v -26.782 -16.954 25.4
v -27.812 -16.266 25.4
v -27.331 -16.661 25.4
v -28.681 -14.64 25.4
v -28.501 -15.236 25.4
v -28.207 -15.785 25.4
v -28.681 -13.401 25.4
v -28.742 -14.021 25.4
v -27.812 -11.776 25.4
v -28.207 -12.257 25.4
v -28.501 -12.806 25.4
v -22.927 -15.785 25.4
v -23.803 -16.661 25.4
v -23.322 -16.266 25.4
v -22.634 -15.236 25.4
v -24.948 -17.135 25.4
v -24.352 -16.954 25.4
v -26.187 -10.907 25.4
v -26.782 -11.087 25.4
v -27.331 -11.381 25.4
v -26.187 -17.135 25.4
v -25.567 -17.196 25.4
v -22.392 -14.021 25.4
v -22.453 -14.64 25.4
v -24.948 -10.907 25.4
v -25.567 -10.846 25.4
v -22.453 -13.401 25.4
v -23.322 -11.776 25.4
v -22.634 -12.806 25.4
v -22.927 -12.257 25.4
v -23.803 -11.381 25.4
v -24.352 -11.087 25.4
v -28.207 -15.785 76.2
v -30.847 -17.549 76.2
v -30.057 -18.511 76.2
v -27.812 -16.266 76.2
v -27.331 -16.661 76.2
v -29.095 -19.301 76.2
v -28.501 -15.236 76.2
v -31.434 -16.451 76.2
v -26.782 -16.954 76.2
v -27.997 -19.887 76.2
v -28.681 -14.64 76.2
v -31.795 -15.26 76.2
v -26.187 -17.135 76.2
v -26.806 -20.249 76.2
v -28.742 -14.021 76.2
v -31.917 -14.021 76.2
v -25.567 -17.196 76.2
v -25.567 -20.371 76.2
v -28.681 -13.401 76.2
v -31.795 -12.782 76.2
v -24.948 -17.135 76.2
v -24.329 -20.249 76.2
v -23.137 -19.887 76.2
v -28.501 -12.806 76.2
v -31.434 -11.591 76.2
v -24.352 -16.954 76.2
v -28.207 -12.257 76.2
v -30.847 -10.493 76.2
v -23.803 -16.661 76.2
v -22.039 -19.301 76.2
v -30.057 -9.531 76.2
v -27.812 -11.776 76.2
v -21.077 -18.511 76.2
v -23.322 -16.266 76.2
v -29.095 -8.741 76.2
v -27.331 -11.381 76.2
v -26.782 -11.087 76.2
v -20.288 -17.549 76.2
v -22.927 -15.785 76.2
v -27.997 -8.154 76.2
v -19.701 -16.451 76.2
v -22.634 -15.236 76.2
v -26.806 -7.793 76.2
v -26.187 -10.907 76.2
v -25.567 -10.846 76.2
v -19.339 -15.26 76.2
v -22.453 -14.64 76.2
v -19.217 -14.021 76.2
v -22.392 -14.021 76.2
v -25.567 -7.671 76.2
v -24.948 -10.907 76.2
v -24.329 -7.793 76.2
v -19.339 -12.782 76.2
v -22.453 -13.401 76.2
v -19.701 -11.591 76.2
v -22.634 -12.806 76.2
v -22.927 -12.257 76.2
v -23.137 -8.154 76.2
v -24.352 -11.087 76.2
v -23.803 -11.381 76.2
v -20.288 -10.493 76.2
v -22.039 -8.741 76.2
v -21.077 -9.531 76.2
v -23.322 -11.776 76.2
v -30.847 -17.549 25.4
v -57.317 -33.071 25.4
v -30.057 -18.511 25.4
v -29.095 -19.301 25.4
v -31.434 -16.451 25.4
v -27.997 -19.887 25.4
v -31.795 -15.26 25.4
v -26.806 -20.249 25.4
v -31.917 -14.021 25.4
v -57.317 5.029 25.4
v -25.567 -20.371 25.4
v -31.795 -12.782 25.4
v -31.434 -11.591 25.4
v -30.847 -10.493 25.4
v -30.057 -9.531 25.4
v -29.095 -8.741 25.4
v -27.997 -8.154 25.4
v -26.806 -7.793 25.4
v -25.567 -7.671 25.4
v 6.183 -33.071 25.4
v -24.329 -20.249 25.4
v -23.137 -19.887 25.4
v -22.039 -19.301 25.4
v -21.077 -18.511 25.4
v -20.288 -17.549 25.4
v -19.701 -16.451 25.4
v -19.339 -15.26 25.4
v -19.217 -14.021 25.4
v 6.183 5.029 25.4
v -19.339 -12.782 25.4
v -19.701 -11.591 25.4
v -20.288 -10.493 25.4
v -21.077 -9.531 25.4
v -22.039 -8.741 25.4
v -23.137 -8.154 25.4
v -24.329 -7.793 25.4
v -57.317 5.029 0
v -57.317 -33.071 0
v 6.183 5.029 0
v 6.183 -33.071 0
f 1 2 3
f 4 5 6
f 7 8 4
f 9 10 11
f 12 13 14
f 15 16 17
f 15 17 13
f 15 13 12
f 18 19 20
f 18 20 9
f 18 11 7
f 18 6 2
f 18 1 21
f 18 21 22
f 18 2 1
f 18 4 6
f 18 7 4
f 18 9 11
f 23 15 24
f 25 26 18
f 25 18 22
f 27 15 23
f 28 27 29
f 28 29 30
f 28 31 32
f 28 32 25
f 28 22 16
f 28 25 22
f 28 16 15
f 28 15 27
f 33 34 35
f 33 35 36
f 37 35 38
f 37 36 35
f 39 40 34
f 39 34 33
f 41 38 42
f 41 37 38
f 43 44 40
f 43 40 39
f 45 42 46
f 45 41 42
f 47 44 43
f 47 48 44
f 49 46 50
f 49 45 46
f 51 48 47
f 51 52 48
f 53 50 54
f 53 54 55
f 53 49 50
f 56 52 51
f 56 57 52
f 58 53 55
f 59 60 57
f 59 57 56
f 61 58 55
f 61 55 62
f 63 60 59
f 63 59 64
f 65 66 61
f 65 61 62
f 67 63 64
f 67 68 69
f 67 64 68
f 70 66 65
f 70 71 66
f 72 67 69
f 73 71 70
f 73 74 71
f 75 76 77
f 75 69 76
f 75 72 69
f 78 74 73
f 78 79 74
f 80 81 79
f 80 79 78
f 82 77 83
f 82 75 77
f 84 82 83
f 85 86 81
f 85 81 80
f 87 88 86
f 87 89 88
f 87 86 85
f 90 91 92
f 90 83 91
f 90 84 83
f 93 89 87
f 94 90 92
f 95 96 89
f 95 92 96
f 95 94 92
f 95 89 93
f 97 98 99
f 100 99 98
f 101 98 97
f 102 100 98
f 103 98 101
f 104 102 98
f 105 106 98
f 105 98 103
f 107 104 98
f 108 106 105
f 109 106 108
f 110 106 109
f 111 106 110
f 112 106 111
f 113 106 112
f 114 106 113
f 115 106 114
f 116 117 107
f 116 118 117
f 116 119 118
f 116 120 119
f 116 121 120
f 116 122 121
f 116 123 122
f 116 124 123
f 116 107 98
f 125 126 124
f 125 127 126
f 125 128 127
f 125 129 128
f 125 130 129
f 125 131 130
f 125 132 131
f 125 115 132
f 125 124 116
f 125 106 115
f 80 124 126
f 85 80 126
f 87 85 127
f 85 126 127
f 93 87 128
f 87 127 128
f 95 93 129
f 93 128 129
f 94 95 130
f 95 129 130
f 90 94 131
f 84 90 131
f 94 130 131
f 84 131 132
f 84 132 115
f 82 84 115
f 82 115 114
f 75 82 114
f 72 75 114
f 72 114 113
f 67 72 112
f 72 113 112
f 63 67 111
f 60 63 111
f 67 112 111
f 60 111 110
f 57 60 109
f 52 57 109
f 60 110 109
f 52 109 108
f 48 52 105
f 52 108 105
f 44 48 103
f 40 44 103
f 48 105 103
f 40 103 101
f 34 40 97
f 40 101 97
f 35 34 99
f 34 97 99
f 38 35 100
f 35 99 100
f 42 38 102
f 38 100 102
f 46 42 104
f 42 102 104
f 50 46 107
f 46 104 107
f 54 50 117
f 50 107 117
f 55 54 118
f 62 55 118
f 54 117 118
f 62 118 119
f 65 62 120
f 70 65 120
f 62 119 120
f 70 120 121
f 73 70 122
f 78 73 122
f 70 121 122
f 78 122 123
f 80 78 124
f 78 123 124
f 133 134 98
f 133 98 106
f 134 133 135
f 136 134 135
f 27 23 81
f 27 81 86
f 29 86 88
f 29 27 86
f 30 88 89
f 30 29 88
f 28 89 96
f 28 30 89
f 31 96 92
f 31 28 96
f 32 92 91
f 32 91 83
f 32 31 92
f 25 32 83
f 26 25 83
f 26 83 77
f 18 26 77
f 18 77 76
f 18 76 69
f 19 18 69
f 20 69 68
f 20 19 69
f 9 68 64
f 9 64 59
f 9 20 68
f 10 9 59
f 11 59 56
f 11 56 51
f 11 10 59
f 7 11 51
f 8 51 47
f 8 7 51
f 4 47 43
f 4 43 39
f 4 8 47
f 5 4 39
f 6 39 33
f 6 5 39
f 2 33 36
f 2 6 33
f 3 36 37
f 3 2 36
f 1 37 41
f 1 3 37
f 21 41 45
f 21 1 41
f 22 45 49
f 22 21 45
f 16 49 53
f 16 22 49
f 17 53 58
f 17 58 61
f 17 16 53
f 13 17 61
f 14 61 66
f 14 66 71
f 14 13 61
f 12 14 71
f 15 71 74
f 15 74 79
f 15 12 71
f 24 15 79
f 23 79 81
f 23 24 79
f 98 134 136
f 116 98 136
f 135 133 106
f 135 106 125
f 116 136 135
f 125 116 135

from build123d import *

# Parameters (mm, degrees)
F0_W     = 63.5
F0_H     = 38.1
F1_DEPTH = 25.4
F2_R     = 6.35
F2_R_2   = 3.175
F3_DEPTH = 50.8


with BuildPart() as f1:
    # F0 (on Top) → F1 (new body)
    with BuildSketch(Plane.XY):
        with Locations((-25.567356, -14.020799)):
            Rectangle(F0_W, F0_H)
    extrude(amount=F1_DEPTH)

    # F2 (on face) → F3 (join)
    with BuildSketch(Plane.XY.offset(25.4)):
        with Locations((-25.567356, -14.020799)):
            Circle(F2_R)
        with Locations((-25.567356, -14.020799)):
            Circle(F2_R_2, mode=Mode.SUBTRACT)
    extrude(amount=F3_DEPTH)


solid = f1.part
